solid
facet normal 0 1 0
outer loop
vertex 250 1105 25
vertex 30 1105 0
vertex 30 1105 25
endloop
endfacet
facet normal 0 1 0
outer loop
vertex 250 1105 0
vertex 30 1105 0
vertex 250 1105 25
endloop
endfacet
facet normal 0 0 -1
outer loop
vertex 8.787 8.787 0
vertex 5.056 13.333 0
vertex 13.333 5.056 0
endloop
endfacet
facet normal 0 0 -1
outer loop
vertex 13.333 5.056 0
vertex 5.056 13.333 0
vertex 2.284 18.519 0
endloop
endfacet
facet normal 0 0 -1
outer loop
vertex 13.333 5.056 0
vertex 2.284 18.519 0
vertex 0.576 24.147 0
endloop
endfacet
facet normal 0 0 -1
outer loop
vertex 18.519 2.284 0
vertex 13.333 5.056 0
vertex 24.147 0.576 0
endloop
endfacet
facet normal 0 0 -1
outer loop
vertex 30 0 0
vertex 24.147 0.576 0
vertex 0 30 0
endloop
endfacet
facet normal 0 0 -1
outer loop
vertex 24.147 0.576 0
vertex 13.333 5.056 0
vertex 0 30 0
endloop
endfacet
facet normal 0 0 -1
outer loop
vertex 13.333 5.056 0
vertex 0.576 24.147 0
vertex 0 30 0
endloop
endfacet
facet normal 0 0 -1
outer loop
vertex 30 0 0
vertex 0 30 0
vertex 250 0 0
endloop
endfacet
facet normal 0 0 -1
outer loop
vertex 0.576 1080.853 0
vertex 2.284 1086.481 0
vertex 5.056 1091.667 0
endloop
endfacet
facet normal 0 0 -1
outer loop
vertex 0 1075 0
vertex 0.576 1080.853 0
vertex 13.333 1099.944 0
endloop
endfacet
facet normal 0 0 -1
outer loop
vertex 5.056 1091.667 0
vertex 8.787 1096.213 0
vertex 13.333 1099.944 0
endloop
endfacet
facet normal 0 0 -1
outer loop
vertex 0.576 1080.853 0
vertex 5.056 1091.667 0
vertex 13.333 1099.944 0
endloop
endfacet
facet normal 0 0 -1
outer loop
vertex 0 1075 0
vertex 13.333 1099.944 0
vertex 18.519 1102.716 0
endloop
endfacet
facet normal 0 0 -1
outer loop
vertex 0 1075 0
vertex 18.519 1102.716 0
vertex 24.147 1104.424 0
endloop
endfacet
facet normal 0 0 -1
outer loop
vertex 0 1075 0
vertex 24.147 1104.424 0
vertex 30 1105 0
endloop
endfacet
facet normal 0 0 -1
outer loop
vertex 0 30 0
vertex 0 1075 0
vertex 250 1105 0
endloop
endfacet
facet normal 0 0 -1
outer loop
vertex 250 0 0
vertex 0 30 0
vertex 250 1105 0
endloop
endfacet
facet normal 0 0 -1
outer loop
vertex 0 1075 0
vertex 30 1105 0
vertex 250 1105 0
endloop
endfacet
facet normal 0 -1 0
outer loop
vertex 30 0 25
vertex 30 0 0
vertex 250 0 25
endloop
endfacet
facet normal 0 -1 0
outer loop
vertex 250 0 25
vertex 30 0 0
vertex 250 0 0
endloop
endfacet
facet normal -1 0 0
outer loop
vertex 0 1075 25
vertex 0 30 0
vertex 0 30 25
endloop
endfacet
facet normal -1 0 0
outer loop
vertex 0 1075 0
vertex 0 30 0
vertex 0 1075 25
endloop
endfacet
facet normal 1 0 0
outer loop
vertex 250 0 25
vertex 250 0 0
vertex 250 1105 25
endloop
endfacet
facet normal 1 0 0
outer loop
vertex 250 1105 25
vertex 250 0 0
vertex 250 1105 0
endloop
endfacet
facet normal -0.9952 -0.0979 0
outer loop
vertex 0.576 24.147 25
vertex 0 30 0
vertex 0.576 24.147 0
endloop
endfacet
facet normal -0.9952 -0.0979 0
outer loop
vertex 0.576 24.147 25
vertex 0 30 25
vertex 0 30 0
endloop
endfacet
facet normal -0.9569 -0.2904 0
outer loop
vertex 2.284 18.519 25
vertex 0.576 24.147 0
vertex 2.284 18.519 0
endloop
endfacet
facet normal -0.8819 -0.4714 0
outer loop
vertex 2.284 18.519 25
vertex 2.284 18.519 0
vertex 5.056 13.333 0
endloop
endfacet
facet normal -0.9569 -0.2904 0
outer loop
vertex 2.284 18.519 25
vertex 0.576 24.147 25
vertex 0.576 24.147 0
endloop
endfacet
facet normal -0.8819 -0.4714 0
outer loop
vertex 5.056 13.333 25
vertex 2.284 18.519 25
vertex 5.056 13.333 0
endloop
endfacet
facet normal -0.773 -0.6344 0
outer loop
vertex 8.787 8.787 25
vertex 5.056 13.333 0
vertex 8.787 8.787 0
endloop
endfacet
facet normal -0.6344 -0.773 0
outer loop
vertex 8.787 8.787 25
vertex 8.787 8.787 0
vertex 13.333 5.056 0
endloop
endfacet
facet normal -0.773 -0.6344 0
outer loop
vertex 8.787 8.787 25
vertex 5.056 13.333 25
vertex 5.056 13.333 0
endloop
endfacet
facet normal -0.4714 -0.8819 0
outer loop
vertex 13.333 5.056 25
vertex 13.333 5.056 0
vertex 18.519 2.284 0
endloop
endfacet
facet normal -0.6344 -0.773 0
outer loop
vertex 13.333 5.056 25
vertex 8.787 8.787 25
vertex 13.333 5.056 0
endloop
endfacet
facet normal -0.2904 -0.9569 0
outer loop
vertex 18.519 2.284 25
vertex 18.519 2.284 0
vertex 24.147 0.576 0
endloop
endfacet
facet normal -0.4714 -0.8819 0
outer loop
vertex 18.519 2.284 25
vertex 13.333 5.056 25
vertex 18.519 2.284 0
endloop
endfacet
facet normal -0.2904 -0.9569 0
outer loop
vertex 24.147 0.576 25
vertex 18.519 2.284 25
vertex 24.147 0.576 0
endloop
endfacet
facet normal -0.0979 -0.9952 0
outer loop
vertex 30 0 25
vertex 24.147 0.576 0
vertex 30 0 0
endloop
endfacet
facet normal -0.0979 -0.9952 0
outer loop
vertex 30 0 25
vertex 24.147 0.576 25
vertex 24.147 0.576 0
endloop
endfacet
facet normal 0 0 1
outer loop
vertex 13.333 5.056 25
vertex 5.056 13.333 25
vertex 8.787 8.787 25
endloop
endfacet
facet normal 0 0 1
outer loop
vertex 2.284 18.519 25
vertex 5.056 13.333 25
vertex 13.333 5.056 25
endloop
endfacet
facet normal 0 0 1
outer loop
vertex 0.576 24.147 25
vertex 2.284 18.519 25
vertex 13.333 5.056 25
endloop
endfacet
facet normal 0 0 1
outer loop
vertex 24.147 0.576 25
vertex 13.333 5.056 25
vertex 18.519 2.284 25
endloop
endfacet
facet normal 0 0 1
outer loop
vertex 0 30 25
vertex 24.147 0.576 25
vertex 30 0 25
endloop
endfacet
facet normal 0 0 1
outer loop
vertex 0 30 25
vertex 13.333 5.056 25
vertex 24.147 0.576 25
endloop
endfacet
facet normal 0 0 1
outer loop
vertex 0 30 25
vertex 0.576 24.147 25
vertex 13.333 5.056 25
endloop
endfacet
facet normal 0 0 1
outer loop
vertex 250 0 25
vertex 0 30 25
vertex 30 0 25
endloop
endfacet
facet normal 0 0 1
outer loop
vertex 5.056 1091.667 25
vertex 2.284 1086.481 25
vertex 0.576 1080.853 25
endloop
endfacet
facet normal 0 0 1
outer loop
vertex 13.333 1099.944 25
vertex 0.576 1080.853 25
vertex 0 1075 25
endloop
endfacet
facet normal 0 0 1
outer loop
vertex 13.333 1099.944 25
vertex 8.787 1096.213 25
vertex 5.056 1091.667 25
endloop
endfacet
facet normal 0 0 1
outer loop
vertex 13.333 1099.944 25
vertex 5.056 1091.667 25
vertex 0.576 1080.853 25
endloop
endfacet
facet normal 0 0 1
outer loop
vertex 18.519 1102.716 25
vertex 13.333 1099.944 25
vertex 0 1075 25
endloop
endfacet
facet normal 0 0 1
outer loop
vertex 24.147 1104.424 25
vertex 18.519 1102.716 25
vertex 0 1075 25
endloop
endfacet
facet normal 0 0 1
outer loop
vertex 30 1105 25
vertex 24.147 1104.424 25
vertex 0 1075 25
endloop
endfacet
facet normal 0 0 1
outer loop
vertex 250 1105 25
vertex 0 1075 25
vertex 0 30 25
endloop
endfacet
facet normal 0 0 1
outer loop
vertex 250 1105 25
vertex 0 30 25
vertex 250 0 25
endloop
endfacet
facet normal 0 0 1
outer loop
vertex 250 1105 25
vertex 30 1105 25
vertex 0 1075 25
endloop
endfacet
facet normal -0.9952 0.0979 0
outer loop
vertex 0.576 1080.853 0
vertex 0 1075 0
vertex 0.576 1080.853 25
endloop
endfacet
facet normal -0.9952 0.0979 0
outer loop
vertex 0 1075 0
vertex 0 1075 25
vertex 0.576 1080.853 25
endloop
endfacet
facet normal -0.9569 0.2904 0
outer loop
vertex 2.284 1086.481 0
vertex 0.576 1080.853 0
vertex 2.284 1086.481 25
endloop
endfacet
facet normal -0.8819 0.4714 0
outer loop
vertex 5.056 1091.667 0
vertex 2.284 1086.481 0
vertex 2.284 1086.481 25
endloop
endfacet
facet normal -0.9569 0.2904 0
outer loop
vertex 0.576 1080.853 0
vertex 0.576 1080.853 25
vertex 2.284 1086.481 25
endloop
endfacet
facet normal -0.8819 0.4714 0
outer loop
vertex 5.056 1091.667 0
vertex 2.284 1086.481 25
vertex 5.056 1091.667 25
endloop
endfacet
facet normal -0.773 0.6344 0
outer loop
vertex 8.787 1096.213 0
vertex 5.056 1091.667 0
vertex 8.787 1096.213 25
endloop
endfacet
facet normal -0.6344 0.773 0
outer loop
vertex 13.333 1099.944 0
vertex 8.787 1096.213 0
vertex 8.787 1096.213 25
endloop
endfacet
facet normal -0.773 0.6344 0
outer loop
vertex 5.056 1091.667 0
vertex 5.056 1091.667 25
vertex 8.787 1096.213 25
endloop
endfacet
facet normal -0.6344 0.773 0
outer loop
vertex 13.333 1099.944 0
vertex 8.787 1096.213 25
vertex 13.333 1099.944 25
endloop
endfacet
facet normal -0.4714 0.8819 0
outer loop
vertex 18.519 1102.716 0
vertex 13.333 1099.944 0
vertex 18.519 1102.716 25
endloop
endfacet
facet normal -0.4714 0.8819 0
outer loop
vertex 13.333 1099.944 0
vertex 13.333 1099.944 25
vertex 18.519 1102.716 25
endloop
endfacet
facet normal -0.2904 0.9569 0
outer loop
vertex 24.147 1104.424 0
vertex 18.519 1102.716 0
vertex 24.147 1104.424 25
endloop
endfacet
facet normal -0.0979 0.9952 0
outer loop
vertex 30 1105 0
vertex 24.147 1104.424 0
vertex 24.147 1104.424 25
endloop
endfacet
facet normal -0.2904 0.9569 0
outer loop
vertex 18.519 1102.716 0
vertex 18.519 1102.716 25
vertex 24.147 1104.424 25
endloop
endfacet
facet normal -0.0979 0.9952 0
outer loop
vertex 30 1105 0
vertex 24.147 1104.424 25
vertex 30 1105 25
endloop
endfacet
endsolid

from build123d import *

# Parameters (mm, degrees)
SKETCH1_W           = 250
SKETCH1_H           = 1105
BOSS_EXTRUDE1_DEPTH = 25
FILLET1_R           = 30
FILLET2_R           = 30


with BuildPart() as part:
    # Sketch1 → Boss-Extrude1 (new body)
    with BuildSketch(Plane.XY):
        with Locations((125, 552.5)):
            Rectangle(SKETCH1_W, SKETCH1_H)
    extrude(amount=BOSS_EXTRUDE1_DEPTH)

    # Fillet1
    fillet1_edges = [part.edges().sort_by_distance(p)[0] for p in [
        (0, 1105, 12.5),
    ]]
    fillet(fillet1_edges, radius=FILLET1_R)

    # Fillet2
    fillet2_edges = [part.edges().sort_by_distance(p)[0] for p in [
        (0, 0, 12.5),
    ]]
    fillet(fillet2_edges, radius=FILLET2_R)


solid = part.part
